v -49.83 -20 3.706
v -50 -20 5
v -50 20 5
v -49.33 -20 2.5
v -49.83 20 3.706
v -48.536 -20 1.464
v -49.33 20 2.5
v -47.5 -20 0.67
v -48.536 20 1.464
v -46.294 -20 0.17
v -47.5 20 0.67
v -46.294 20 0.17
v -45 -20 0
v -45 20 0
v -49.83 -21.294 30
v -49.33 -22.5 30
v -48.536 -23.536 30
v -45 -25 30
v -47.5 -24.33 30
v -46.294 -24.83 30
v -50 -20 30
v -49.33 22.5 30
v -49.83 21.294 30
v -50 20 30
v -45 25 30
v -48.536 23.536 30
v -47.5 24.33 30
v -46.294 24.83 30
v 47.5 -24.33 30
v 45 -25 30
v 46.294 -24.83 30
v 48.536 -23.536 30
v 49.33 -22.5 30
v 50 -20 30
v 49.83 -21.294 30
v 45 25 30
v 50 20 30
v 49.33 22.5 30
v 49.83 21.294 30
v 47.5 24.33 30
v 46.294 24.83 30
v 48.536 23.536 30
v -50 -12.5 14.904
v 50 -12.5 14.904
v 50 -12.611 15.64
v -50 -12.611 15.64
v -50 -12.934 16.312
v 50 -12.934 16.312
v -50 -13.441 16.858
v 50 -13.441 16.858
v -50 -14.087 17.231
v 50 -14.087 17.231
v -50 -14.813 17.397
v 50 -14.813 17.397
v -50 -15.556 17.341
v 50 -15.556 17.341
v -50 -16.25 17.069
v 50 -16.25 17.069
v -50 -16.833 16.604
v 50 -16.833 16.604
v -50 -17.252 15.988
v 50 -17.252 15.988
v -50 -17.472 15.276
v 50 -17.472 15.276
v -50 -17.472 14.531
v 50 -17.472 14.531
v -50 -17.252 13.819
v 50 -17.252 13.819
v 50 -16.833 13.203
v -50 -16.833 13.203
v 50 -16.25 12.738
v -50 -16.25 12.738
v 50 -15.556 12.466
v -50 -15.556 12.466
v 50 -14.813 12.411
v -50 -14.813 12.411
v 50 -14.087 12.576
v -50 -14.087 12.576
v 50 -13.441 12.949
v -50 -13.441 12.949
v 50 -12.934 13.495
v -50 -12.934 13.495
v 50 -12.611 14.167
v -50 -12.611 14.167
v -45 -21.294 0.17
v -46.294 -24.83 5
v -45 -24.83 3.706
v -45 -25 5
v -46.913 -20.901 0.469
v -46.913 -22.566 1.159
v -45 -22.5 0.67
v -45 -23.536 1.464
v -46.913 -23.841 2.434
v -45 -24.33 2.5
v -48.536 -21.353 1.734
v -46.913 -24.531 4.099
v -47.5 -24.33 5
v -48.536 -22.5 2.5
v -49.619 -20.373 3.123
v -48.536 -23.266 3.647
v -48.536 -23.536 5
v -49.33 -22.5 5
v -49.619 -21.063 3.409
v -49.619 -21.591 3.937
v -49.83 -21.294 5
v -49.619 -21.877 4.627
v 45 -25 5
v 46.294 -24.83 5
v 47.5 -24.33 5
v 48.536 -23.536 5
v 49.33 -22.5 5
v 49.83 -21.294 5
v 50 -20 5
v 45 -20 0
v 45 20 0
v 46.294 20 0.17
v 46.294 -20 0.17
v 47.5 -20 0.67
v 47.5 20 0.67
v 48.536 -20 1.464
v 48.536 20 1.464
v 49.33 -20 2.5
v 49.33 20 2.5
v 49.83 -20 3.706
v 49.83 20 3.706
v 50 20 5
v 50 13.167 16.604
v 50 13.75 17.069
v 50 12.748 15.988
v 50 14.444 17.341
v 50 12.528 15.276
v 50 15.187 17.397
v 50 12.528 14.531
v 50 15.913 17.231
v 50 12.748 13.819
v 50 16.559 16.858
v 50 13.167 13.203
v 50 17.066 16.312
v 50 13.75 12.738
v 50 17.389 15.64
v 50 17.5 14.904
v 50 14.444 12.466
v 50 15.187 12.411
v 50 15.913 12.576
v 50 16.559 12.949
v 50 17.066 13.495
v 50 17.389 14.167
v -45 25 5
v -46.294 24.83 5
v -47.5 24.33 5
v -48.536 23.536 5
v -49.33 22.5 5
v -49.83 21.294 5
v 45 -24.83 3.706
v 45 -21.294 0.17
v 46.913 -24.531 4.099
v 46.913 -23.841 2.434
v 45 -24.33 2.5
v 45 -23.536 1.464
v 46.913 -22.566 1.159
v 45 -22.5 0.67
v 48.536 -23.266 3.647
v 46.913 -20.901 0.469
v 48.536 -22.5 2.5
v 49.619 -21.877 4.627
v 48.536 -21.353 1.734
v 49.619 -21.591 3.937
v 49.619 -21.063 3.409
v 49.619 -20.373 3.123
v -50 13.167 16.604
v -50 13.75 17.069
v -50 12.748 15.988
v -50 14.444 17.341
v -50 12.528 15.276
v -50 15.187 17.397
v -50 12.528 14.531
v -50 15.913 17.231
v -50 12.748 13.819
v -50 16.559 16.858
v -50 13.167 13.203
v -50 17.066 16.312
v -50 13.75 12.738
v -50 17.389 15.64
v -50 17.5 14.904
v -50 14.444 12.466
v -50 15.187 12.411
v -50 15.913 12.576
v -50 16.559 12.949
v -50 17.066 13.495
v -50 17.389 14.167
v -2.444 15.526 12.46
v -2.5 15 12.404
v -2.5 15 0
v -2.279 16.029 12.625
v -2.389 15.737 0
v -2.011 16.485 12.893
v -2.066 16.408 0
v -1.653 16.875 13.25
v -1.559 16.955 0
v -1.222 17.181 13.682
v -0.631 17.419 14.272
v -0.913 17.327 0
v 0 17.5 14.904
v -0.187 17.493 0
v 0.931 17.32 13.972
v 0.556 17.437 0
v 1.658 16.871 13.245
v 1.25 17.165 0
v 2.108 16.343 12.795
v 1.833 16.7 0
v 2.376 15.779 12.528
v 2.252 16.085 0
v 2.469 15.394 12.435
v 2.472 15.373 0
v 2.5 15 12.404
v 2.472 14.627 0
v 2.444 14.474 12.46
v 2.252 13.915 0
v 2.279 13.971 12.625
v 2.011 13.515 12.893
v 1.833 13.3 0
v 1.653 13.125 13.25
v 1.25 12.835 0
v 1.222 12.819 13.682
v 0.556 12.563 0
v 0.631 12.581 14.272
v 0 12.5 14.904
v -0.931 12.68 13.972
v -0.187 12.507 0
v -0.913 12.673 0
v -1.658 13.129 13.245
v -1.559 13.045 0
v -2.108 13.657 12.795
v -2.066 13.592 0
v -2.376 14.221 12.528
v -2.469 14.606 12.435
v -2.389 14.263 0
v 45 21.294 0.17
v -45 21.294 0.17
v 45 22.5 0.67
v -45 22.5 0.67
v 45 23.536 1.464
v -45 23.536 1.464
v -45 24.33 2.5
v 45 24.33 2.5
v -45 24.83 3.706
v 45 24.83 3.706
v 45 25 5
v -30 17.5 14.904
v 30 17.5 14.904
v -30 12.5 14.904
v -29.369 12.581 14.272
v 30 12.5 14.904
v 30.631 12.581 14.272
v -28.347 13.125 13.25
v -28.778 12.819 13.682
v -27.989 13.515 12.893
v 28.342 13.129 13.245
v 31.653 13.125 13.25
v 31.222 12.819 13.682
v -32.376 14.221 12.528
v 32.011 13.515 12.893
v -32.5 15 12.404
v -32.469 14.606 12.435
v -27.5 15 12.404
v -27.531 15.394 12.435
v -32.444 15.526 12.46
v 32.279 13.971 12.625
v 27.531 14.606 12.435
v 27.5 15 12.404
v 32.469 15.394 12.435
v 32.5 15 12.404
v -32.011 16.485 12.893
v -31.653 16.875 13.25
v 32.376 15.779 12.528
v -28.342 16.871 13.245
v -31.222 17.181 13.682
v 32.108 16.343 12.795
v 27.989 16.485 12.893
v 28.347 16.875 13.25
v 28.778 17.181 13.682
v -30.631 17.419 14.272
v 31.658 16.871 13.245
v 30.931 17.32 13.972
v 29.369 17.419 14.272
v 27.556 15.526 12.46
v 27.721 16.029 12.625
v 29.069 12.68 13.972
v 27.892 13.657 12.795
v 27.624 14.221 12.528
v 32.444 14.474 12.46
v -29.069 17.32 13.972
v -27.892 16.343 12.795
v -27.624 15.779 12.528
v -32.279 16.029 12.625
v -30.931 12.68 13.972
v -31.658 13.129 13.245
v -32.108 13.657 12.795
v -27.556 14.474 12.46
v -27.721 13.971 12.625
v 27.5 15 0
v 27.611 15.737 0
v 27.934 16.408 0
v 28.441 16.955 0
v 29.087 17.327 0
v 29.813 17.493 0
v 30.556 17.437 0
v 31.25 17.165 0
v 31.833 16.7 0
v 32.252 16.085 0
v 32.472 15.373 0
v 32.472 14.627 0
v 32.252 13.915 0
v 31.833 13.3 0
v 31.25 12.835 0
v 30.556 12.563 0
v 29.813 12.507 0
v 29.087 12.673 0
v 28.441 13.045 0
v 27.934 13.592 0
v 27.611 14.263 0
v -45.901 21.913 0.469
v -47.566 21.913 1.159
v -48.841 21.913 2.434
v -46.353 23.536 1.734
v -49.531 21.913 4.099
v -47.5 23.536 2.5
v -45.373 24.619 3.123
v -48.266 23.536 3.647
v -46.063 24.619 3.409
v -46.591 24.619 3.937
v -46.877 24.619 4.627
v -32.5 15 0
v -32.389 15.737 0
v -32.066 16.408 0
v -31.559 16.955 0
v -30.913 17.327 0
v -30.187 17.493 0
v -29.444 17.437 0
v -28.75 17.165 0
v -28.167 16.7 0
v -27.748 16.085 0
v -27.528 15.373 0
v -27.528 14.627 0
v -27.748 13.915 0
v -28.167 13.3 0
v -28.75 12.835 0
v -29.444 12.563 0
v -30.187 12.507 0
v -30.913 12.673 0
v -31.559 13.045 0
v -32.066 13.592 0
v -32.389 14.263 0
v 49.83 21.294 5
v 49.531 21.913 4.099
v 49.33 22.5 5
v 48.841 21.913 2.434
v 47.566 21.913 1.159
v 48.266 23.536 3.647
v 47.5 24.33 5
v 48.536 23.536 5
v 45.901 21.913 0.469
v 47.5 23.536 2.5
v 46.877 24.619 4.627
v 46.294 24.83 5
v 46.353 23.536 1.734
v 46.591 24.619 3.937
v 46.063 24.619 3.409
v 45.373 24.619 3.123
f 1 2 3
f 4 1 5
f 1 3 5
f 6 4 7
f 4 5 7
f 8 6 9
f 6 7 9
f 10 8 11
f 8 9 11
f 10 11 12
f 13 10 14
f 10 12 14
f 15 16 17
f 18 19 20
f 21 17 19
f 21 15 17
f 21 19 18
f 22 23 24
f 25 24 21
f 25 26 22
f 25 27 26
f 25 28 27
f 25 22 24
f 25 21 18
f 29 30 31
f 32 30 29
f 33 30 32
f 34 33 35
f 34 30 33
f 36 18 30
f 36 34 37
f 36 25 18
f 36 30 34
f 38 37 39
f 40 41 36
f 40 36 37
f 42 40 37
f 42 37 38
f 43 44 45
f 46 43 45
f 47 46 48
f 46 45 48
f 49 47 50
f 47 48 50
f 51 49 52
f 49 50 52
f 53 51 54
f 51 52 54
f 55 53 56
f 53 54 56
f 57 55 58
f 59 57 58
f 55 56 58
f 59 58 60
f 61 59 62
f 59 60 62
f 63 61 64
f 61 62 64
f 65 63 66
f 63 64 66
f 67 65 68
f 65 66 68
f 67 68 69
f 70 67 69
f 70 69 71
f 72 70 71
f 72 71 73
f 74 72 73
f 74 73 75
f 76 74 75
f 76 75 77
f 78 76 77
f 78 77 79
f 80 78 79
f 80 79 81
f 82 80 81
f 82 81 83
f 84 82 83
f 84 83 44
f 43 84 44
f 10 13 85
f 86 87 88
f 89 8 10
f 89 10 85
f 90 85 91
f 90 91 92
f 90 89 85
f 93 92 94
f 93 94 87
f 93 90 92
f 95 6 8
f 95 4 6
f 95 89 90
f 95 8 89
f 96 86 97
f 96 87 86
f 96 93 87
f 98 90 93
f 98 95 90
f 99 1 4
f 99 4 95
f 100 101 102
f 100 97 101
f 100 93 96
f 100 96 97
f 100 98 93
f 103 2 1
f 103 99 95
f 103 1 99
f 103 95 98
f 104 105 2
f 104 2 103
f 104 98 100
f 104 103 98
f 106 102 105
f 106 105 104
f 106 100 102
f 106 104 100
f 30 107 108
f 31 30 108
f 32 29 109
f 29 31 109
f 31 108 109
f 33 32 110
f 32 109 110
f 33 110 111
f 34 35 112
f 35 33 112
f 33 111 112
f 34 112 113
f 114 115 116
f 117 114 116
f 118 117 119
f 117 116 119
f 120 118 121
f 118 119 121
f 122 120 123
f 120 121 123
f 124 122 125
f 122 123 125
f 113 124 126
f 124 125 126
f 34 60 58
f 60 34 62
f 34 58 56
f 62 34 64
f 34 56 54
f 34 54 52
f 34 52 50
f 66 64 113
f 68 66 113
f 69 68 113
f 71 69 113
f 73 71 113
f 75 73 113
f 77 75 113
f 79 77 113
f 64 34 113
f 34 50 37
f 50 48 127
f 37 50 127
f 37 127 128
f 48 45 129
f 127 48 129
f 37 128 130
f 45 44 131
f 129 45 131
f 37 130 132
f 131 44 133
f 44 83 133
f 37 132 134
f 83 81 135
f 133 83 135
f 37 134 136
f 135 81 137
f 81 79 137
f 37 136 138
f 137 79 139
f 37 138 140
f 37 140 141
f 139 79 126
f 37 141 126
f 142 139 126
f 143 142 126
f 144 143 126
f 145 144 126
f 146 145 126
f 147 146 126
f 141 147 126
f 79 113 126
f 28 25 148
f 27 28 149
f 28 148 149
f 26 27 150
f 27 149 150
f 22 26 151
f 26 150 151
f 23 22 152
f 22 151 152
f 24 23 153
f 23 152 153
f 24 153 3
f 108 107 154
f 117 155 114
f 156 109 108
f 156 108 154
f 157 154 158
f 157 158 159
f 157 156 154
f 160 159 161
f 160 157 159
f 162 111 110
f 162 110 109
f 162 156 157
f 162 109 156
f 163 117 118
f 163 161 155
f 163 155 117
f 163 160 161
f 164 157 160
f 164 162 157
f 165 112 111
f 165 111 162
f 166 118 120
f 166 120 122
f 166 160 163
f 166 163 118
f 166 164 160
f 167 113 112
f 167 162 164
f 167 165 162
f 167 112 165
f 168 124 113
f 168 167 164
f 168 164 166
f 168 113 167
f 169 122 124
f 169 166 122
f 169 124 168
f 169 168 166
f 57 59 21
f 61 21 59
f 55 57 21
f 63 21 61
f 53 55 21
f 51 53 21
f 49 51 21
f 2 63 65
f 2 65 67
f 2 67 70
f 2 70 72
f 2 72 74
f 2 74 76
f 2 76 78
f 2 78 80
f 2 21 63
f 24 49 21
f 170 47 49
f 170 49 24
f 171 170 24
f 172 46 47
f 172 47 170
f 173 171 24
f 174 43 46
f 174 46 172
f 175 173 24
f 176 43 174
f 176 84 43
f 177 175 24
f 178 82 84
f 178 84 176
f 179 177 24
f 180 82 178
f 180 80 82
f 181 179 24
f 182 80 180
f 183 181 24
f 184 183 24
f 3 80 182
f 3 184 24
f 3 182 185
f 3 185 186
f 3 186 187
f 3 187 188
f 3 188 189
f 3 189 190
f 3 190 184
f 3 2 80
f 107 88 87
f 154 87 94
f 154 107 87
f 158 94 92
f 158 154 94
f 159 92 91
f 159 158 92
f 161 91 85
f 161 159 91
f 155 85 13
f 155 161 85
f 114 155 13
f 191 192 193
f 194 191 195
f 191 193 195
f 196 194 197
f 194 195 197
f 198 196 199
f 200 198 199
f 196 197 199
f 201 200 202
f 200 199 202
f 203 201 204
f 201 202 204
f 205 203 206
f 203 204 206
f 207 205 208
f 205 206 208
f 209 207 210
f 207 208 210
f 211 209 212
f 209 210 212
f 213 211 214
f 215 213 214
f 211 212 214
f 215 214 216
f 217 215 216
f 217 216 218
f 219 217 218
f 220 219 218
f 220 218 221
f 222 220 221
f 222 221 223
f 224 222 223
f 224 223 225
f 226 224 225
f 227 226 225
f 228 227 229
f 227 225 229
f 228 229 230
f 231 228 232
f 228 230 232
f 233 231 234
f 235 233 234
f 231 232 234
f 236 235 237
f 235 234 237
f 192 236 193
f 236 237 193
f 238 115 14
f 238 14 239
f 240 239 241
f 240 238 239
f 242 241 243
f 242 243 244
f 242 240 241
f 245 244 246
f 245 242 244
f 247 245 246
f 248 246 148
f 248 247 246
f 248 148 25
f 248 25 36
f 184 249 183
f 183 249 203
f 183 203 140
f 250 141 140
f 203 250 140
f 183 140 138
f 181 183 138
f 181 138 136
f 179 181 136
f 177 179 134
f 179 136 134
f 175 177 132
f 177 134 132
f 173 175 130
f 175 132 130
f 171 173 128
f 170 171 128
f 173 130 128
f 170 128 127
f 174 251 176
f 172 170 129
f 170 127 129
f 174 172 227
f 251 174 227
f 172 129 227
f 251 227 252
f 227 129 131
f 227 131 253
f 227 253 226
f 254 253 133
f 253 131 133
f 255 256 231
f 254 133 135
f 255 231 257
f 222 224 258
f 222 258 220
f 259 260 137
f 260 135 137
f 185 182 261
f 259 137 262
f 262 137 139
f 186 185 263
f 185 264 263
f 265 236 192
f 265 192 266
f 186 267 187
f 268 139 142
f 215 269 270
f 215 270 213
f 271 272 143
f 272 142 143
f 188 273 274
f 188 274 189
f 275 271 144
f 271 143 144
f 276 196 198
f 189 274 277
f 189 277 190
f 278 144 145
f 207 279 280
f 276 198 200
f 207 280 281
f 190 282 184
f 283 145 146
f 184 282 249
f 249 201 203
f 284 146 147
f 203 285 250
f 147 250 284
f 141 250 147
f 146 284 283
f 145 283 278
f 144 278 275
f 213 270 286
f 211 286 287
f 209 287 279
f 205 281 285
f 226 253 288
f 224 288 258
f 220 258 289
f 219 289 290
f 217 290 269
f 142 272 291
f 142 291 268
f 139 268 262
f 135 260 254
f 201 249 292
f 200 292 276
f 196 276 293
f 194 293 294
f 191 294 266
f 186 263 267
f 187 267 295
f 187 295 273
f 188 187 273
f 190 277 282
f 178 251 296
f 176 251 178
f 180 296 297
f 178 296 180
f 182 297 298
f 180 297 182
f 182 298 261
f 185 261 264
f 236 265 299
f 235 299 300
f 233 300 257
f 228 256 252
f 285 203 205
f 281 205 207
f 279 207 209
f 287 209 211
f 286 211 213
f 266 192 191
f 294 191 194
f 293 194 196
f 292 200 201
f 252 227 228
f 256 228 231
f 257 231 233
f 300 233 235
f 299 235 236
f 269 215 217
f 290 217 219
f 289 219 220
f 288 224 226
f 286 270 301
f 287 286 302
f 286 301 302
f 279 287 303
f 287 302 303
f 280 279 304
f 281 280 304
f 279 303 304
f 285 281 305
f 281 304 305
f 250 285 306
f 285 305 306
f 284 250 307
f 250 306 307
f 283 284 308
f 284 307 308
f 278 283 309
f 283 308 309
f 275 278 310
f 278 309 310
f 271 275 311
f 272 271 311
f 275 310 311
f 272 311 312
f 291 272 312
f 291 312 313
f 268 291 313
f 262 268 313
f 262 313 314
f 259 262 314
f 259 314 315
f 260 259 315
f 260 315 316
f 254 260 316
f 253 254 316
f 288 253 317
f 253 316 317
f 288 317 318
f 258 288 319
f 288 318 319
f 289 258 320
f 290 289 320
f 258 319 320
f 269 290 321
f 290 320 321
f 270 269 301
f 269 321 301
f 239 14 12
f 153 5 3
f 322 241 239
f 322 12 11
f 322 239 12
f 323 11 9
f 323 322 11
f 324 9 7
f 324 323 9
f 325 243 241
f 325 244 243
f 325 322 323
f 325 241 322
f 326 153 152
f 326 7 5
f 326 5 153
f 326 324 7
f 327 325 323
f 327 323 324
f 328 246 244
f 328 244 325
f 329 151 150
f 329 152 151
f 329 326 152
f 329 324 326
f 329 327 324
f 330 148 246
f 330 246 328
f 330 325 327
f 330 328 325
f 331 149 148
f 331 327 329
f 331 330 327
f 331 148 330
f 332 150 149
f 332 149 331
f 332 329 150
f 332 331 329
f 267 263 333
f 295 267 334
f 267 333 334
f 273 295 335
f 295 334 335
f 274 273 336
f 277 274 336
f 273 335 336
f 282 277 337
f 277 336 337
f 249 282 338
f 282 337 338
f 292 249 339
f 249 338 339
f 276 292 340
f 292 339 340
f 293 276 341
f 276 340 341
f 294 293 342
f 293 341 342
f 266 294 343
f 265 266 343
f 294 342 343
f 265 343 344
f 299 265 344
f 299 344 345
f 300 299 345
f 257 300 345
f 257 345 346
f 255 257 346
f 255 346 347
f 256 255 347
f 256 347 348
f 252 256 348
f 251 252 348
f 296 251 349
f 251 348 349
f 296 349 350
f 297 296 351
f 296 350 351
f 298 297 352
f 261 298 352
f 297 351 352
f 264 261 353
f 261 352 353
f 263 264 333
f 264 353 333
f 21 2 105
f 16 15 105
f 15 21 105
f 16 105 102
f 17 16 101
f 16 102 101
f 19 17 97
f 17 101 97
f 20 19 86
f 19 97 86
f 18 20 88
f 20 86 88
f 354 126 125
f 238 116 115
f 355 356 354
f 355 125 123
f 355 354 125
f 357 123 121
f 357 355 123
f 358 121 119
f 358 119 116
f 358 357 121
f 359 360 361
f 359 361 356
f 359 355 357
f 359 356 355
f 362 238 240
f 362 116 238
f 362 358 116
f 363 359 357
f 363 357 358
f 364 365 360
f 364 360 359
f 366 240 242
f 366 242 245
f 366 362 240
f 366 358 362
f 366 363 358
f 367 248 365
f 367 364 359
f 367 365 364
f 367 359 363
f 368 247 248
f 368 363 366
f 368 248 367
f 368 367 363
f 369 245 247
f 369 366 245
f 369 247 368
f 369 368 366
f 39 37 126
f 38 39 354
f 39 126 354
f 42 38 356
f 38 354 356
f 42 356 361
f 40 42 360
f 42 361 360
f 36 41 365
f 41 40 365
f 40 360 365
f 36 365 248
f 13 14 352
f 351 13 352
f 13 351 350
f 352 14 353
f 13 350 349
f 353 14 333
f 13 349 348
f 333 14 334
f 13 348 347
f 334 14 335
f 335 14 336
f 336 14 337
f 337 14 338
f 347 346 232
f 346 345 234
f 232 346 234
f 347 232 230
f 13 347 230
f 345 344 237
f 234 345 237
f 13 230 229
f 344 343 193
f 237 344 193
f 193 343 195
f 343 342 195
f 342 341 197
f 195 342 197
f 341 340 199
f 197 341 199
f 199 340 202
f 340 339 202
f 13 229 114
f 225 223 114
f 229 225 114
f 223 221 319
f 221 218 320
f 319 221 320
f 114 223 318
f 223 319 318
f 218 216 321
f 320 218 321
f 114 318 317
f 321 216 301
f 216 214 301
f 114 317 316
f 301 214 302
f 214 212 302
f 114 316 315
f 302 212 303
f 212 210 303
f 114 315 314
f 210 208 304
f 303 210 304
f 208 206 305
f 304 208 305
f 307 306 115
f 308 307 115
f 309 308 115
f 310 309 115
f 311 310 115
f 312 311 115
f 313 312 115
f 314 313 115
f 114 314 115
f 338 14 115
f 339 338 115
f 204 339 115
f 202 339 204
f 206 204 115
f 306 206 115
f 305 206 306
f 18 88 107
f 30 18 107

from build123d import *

# Parameters (mm, degrees)
SKETCH1_W               = 100
SKETCH1_H               = 50
BOSS_EXTRUDE1_DEPTH     = 30
SKETCH2_R               = 2.5
CUT_EXTRUDE1_DEPTH      = 108.354552768
FILLET1_R               = 5
CUT_EXTRUDE2_REACH      = 65.443
CUT_EXTRUDE2_END_RADIUS = 2.5
SKETCH3_R               = 2.5
FILLET2_R               = 5


with BuildPart() as part:
    # Sketch1 → Boss-Extrude1 (new body)
    with BuildSketch(Plane.XY):
        Rectangle(SKETCH1_W, SKETCH1_H)
    extrude(amount=BOSS_EXTRUDE1_DEPTH)

    # Sketch2 → Cut-Extrude1 (cut, through all)
    with BuildSketch(Plane(origin=(50, 0, 0), x_dir=(0, 0, -1), z_dir=(1, 0, 0))):
        with Locations(Location((-14.903548917, 15, 0), (0, 0, 90))):
            Circle(SKETCH2_R)
        with Locations(Location((-14.903548917, -15, 0), (0, 0, 90))):
            Circle(SKETCH2_R)
    extrude(amount=-CUT_EXTRUDE1_DEPTH, mode=Mode.SUBTRACT)

    # Fillet1
    fillet1_edges = [part.edges().sort_by_distance(p)[0] for p in [
        (0, -25, 0),
        (-50, 0, 0),
        (0, 25, 0),
        (50, 0, 0),
    ]]
    fillet(fillet1_edges, radius=FILLET1_R)

    # Cut-Extrude2: up to this cylinder (the profile starts outside it)
    cut_extrude2_end = Plane(origin=(0, 15, 14.903548917), z_dir=(1, 0, 0)) * Cylinder(CUT_EXTRUDE2_END_RADIUS, 196.886, mode=Mode.PRIVATE)
    # Sketch3 → Cut-Extrude2 (cut, up to the surface)
    with BuildSketch(Plane(origin=(0, 0, 0), x_dir=(-1, 0, 0), z_dir=(0, 0, -1)), mode=Mode.PRIVATE) as cut_extrude2_sk1:
        with Locations((-30, 15)):
            Circle(SKETCH3_R)
    cut_extrude2_tool1 = extrude(cut_extrude2_sk1.sketch, amount=-CUT_EXTRUDE2_REACH, mode=Mode.PRIVATE) - cut_extrude2_end
    add(cut_extrude2_tool1.solids().sort_by_distance((30, 15, 0))[0], mode=Mode.SUBTRACT)
    # Sketch3 → Cut-Extrude2 (cut, up to the surface)
    with BuildSketch(Plane(origin=(0, 0, 0), x_dir=(-1, 0, 0), z_dir=(0, 0, -1)), mode=Mode.PRIVATE) as cut_extrude2_sk2:
        with Locations((30, 15)):
            Circle(SKETCH3_R)
    cut_extrude2_tool2 = extrude(cut_extrude2_sk2.sketch, amount=-CUT_EXTRUDE2_REACH, mode=Mode.PRIVATE) - cut_extrude2_end
    add(cut_extrude2_tool2.solids().sort_by_distance((-30, 15, 0))[0], mode=Mode.SUBTRACT)
    # Sketch3 → Cut-Extrude2 (cut, up to the surface)
    with BuildSketch(Plane(origin=(0, 0, 0), x_dir=(-1, 0, 0), z_dir=(0, 0, -1)), mode=Mode.PRIVATE) as cut_extrude2_sk3:
        with Locations((0, 15)):
            Circle(SKETCH3_R)
    cut_extrude2_tool3 = extrude(cut_extrude2_sk3.sketch, amount=-CUT_EXTRUDE2_REACH, mode=Mode.PRIVATE) - cut_extrude2_end
    add(cut_extrude2_tool3.solids().sort_by_distance((0, 15, 0))[0], mode=Mode.SUBTRACT)

    # Fillet2
    # the kernel refuses this fillet: 5 mm, written as the material it takes off along each edge
    with BuildSketch(Plane(origin=(-45, -20, 5), x_dir=(0, -1, 0), z_dir=(-1, 0, 0))) as fillet2_piece_1_section:
        Polygon((0, 0), (FILLET2_R, 0), (FILLET2_R, -FILLET2_R), (0, -FILLET2_R), align=None)
    fillet2_piece_1 = extrude(amount=FILLET2_R, mode=Mode.PRIVATE)
    fillet2_piece_1 = fillet2_piece_1 - Plane(origin=(-45, -20, 5), x_dir=(0, 0.7071067811865475, 0.7071067811865475), z_dir=(-1, 0, 0)) * Sphere(FILLET2_R, mode=Mode.PRIVATE)
    add(fillet2_piece_1, mode=Mode.SUBTRACT)
    with BuildSketch(Plane(origin=(-45, 20, 5), x_dir=(-1, 0, 0), z_dir=(0, 1, 0))) as fillet2_piece_2_section:
        Polygon((0, 0), (FILLET2_R, 0), (FILLET2_R, -FILLET2_R), (0, -FILLET2_R), align=None)
    fillet2_piece_2 = extrude(amount=FILLET2_R, mode=Mode.PRIVATE)
    fillet2_piece_2 = fillet2_piece_2 - Plane(origin=(-45, 20, 5), x_dir=(0.7071067811865475, 0, 0.7071067811865475), z_dir=(0, 1, 0)) * Sphere(FILLET2_R, mode=Mode.PRIVATE)
    add(fillet2_piece_2, mode=Mode.SUBTRACT)
    with BuildSketch(Plane(origin=(45, -20, 5), x_dir=(0, -1, 0), z_dir=(1, 0, 0))) as fillet2_piece_3_section:
        Polygon((0, 0), (FILLET2_R, 0), (FILLET2_R, FILLET2_R), (0, FILLET2_R), align=None)
    fillet2_piece_3 = extrude(amount=FILLET2_R, mode=Mode.PRIVATE)
    fillet2_piece_3 = fillet2_piece_3 - Plane(origin=(45, -20, 5), x_dir=(0, 0.7071067811865475, 0.7071067811865475), z_dir=(1, 0, 0)) * Sphere(FILLET2_R, mode=Mode.PRIVATE)
    add(fillet2_piece_3, mode=Mode.SUBTRACT)
    with BuildSketch(Plane(origin=(45, 20, 5), x_dir=(1, 0, 0), z_dir=(0, 1, 0))) as fillet2_piece_4_section:
        Polygon((0, 0), (FILLET2_R, 0), (FILLET2_R, FILLET2_R), (0, FILLET2_R), align=None)
    fillet2_piece_4 = extrude(amount=FILLET2_R, mode=Mode.PRIVATE)
    fillet2_piece_4 = fillet2_piece_4 - Plane(origin=(45, 20, 5), x_dir=(-0.7071067811865475, 0, 0.7071067811865475), z_dir=(0, 1, 0)) * Sphere(FILLET2_R, mode=Mode.PRIVATE)
    add(fillet2_piece_4, mode=Mode.SUBTRACT)
    with BuildSketch(Plane(origin=(50, -25, 5), x_dir=(0, 1, 0), z_dir=(0, 0, 1)), Plane(origin=(50, 25, 5), x_dir=(-1, 0, 0), z_dir=(0, 0, 1))) as fillet2_piece_5:
        with BuildLine():
            CenterArc((FILLET2_R, FILLET2_R), FILLET2_R, 180, 90)
            Line((0, FILLET2_R), (0, 0))
            Line((0, 0), (FILLET2_R, 0))
        make_face()
    extrude(amount=37.5, mode=Mode.SUBTRACT)
    with BuildSketch(Plane(origin=(-50, -25, 5), x_dir=(0, 1, 0), z_dir=(0, 0, 1)), Plane(origin=(-50, 25, 5), x_dir=(1, 0, 0), z_dir=(0, 0, 1))) as fillet2_piece_6:
        with BuildLine():
            CenterArc((FILLET2_R, -FILLET2_R), FILLET2_R, 90, 90)
            Line((0, -FILLET2_R), (0, 0))
            Line((0, 0), (FILLET2_R, 0))
        make_face()
    extrude(amount=37.5, mode=Mode.SUBTRACT)


solid = part.part
